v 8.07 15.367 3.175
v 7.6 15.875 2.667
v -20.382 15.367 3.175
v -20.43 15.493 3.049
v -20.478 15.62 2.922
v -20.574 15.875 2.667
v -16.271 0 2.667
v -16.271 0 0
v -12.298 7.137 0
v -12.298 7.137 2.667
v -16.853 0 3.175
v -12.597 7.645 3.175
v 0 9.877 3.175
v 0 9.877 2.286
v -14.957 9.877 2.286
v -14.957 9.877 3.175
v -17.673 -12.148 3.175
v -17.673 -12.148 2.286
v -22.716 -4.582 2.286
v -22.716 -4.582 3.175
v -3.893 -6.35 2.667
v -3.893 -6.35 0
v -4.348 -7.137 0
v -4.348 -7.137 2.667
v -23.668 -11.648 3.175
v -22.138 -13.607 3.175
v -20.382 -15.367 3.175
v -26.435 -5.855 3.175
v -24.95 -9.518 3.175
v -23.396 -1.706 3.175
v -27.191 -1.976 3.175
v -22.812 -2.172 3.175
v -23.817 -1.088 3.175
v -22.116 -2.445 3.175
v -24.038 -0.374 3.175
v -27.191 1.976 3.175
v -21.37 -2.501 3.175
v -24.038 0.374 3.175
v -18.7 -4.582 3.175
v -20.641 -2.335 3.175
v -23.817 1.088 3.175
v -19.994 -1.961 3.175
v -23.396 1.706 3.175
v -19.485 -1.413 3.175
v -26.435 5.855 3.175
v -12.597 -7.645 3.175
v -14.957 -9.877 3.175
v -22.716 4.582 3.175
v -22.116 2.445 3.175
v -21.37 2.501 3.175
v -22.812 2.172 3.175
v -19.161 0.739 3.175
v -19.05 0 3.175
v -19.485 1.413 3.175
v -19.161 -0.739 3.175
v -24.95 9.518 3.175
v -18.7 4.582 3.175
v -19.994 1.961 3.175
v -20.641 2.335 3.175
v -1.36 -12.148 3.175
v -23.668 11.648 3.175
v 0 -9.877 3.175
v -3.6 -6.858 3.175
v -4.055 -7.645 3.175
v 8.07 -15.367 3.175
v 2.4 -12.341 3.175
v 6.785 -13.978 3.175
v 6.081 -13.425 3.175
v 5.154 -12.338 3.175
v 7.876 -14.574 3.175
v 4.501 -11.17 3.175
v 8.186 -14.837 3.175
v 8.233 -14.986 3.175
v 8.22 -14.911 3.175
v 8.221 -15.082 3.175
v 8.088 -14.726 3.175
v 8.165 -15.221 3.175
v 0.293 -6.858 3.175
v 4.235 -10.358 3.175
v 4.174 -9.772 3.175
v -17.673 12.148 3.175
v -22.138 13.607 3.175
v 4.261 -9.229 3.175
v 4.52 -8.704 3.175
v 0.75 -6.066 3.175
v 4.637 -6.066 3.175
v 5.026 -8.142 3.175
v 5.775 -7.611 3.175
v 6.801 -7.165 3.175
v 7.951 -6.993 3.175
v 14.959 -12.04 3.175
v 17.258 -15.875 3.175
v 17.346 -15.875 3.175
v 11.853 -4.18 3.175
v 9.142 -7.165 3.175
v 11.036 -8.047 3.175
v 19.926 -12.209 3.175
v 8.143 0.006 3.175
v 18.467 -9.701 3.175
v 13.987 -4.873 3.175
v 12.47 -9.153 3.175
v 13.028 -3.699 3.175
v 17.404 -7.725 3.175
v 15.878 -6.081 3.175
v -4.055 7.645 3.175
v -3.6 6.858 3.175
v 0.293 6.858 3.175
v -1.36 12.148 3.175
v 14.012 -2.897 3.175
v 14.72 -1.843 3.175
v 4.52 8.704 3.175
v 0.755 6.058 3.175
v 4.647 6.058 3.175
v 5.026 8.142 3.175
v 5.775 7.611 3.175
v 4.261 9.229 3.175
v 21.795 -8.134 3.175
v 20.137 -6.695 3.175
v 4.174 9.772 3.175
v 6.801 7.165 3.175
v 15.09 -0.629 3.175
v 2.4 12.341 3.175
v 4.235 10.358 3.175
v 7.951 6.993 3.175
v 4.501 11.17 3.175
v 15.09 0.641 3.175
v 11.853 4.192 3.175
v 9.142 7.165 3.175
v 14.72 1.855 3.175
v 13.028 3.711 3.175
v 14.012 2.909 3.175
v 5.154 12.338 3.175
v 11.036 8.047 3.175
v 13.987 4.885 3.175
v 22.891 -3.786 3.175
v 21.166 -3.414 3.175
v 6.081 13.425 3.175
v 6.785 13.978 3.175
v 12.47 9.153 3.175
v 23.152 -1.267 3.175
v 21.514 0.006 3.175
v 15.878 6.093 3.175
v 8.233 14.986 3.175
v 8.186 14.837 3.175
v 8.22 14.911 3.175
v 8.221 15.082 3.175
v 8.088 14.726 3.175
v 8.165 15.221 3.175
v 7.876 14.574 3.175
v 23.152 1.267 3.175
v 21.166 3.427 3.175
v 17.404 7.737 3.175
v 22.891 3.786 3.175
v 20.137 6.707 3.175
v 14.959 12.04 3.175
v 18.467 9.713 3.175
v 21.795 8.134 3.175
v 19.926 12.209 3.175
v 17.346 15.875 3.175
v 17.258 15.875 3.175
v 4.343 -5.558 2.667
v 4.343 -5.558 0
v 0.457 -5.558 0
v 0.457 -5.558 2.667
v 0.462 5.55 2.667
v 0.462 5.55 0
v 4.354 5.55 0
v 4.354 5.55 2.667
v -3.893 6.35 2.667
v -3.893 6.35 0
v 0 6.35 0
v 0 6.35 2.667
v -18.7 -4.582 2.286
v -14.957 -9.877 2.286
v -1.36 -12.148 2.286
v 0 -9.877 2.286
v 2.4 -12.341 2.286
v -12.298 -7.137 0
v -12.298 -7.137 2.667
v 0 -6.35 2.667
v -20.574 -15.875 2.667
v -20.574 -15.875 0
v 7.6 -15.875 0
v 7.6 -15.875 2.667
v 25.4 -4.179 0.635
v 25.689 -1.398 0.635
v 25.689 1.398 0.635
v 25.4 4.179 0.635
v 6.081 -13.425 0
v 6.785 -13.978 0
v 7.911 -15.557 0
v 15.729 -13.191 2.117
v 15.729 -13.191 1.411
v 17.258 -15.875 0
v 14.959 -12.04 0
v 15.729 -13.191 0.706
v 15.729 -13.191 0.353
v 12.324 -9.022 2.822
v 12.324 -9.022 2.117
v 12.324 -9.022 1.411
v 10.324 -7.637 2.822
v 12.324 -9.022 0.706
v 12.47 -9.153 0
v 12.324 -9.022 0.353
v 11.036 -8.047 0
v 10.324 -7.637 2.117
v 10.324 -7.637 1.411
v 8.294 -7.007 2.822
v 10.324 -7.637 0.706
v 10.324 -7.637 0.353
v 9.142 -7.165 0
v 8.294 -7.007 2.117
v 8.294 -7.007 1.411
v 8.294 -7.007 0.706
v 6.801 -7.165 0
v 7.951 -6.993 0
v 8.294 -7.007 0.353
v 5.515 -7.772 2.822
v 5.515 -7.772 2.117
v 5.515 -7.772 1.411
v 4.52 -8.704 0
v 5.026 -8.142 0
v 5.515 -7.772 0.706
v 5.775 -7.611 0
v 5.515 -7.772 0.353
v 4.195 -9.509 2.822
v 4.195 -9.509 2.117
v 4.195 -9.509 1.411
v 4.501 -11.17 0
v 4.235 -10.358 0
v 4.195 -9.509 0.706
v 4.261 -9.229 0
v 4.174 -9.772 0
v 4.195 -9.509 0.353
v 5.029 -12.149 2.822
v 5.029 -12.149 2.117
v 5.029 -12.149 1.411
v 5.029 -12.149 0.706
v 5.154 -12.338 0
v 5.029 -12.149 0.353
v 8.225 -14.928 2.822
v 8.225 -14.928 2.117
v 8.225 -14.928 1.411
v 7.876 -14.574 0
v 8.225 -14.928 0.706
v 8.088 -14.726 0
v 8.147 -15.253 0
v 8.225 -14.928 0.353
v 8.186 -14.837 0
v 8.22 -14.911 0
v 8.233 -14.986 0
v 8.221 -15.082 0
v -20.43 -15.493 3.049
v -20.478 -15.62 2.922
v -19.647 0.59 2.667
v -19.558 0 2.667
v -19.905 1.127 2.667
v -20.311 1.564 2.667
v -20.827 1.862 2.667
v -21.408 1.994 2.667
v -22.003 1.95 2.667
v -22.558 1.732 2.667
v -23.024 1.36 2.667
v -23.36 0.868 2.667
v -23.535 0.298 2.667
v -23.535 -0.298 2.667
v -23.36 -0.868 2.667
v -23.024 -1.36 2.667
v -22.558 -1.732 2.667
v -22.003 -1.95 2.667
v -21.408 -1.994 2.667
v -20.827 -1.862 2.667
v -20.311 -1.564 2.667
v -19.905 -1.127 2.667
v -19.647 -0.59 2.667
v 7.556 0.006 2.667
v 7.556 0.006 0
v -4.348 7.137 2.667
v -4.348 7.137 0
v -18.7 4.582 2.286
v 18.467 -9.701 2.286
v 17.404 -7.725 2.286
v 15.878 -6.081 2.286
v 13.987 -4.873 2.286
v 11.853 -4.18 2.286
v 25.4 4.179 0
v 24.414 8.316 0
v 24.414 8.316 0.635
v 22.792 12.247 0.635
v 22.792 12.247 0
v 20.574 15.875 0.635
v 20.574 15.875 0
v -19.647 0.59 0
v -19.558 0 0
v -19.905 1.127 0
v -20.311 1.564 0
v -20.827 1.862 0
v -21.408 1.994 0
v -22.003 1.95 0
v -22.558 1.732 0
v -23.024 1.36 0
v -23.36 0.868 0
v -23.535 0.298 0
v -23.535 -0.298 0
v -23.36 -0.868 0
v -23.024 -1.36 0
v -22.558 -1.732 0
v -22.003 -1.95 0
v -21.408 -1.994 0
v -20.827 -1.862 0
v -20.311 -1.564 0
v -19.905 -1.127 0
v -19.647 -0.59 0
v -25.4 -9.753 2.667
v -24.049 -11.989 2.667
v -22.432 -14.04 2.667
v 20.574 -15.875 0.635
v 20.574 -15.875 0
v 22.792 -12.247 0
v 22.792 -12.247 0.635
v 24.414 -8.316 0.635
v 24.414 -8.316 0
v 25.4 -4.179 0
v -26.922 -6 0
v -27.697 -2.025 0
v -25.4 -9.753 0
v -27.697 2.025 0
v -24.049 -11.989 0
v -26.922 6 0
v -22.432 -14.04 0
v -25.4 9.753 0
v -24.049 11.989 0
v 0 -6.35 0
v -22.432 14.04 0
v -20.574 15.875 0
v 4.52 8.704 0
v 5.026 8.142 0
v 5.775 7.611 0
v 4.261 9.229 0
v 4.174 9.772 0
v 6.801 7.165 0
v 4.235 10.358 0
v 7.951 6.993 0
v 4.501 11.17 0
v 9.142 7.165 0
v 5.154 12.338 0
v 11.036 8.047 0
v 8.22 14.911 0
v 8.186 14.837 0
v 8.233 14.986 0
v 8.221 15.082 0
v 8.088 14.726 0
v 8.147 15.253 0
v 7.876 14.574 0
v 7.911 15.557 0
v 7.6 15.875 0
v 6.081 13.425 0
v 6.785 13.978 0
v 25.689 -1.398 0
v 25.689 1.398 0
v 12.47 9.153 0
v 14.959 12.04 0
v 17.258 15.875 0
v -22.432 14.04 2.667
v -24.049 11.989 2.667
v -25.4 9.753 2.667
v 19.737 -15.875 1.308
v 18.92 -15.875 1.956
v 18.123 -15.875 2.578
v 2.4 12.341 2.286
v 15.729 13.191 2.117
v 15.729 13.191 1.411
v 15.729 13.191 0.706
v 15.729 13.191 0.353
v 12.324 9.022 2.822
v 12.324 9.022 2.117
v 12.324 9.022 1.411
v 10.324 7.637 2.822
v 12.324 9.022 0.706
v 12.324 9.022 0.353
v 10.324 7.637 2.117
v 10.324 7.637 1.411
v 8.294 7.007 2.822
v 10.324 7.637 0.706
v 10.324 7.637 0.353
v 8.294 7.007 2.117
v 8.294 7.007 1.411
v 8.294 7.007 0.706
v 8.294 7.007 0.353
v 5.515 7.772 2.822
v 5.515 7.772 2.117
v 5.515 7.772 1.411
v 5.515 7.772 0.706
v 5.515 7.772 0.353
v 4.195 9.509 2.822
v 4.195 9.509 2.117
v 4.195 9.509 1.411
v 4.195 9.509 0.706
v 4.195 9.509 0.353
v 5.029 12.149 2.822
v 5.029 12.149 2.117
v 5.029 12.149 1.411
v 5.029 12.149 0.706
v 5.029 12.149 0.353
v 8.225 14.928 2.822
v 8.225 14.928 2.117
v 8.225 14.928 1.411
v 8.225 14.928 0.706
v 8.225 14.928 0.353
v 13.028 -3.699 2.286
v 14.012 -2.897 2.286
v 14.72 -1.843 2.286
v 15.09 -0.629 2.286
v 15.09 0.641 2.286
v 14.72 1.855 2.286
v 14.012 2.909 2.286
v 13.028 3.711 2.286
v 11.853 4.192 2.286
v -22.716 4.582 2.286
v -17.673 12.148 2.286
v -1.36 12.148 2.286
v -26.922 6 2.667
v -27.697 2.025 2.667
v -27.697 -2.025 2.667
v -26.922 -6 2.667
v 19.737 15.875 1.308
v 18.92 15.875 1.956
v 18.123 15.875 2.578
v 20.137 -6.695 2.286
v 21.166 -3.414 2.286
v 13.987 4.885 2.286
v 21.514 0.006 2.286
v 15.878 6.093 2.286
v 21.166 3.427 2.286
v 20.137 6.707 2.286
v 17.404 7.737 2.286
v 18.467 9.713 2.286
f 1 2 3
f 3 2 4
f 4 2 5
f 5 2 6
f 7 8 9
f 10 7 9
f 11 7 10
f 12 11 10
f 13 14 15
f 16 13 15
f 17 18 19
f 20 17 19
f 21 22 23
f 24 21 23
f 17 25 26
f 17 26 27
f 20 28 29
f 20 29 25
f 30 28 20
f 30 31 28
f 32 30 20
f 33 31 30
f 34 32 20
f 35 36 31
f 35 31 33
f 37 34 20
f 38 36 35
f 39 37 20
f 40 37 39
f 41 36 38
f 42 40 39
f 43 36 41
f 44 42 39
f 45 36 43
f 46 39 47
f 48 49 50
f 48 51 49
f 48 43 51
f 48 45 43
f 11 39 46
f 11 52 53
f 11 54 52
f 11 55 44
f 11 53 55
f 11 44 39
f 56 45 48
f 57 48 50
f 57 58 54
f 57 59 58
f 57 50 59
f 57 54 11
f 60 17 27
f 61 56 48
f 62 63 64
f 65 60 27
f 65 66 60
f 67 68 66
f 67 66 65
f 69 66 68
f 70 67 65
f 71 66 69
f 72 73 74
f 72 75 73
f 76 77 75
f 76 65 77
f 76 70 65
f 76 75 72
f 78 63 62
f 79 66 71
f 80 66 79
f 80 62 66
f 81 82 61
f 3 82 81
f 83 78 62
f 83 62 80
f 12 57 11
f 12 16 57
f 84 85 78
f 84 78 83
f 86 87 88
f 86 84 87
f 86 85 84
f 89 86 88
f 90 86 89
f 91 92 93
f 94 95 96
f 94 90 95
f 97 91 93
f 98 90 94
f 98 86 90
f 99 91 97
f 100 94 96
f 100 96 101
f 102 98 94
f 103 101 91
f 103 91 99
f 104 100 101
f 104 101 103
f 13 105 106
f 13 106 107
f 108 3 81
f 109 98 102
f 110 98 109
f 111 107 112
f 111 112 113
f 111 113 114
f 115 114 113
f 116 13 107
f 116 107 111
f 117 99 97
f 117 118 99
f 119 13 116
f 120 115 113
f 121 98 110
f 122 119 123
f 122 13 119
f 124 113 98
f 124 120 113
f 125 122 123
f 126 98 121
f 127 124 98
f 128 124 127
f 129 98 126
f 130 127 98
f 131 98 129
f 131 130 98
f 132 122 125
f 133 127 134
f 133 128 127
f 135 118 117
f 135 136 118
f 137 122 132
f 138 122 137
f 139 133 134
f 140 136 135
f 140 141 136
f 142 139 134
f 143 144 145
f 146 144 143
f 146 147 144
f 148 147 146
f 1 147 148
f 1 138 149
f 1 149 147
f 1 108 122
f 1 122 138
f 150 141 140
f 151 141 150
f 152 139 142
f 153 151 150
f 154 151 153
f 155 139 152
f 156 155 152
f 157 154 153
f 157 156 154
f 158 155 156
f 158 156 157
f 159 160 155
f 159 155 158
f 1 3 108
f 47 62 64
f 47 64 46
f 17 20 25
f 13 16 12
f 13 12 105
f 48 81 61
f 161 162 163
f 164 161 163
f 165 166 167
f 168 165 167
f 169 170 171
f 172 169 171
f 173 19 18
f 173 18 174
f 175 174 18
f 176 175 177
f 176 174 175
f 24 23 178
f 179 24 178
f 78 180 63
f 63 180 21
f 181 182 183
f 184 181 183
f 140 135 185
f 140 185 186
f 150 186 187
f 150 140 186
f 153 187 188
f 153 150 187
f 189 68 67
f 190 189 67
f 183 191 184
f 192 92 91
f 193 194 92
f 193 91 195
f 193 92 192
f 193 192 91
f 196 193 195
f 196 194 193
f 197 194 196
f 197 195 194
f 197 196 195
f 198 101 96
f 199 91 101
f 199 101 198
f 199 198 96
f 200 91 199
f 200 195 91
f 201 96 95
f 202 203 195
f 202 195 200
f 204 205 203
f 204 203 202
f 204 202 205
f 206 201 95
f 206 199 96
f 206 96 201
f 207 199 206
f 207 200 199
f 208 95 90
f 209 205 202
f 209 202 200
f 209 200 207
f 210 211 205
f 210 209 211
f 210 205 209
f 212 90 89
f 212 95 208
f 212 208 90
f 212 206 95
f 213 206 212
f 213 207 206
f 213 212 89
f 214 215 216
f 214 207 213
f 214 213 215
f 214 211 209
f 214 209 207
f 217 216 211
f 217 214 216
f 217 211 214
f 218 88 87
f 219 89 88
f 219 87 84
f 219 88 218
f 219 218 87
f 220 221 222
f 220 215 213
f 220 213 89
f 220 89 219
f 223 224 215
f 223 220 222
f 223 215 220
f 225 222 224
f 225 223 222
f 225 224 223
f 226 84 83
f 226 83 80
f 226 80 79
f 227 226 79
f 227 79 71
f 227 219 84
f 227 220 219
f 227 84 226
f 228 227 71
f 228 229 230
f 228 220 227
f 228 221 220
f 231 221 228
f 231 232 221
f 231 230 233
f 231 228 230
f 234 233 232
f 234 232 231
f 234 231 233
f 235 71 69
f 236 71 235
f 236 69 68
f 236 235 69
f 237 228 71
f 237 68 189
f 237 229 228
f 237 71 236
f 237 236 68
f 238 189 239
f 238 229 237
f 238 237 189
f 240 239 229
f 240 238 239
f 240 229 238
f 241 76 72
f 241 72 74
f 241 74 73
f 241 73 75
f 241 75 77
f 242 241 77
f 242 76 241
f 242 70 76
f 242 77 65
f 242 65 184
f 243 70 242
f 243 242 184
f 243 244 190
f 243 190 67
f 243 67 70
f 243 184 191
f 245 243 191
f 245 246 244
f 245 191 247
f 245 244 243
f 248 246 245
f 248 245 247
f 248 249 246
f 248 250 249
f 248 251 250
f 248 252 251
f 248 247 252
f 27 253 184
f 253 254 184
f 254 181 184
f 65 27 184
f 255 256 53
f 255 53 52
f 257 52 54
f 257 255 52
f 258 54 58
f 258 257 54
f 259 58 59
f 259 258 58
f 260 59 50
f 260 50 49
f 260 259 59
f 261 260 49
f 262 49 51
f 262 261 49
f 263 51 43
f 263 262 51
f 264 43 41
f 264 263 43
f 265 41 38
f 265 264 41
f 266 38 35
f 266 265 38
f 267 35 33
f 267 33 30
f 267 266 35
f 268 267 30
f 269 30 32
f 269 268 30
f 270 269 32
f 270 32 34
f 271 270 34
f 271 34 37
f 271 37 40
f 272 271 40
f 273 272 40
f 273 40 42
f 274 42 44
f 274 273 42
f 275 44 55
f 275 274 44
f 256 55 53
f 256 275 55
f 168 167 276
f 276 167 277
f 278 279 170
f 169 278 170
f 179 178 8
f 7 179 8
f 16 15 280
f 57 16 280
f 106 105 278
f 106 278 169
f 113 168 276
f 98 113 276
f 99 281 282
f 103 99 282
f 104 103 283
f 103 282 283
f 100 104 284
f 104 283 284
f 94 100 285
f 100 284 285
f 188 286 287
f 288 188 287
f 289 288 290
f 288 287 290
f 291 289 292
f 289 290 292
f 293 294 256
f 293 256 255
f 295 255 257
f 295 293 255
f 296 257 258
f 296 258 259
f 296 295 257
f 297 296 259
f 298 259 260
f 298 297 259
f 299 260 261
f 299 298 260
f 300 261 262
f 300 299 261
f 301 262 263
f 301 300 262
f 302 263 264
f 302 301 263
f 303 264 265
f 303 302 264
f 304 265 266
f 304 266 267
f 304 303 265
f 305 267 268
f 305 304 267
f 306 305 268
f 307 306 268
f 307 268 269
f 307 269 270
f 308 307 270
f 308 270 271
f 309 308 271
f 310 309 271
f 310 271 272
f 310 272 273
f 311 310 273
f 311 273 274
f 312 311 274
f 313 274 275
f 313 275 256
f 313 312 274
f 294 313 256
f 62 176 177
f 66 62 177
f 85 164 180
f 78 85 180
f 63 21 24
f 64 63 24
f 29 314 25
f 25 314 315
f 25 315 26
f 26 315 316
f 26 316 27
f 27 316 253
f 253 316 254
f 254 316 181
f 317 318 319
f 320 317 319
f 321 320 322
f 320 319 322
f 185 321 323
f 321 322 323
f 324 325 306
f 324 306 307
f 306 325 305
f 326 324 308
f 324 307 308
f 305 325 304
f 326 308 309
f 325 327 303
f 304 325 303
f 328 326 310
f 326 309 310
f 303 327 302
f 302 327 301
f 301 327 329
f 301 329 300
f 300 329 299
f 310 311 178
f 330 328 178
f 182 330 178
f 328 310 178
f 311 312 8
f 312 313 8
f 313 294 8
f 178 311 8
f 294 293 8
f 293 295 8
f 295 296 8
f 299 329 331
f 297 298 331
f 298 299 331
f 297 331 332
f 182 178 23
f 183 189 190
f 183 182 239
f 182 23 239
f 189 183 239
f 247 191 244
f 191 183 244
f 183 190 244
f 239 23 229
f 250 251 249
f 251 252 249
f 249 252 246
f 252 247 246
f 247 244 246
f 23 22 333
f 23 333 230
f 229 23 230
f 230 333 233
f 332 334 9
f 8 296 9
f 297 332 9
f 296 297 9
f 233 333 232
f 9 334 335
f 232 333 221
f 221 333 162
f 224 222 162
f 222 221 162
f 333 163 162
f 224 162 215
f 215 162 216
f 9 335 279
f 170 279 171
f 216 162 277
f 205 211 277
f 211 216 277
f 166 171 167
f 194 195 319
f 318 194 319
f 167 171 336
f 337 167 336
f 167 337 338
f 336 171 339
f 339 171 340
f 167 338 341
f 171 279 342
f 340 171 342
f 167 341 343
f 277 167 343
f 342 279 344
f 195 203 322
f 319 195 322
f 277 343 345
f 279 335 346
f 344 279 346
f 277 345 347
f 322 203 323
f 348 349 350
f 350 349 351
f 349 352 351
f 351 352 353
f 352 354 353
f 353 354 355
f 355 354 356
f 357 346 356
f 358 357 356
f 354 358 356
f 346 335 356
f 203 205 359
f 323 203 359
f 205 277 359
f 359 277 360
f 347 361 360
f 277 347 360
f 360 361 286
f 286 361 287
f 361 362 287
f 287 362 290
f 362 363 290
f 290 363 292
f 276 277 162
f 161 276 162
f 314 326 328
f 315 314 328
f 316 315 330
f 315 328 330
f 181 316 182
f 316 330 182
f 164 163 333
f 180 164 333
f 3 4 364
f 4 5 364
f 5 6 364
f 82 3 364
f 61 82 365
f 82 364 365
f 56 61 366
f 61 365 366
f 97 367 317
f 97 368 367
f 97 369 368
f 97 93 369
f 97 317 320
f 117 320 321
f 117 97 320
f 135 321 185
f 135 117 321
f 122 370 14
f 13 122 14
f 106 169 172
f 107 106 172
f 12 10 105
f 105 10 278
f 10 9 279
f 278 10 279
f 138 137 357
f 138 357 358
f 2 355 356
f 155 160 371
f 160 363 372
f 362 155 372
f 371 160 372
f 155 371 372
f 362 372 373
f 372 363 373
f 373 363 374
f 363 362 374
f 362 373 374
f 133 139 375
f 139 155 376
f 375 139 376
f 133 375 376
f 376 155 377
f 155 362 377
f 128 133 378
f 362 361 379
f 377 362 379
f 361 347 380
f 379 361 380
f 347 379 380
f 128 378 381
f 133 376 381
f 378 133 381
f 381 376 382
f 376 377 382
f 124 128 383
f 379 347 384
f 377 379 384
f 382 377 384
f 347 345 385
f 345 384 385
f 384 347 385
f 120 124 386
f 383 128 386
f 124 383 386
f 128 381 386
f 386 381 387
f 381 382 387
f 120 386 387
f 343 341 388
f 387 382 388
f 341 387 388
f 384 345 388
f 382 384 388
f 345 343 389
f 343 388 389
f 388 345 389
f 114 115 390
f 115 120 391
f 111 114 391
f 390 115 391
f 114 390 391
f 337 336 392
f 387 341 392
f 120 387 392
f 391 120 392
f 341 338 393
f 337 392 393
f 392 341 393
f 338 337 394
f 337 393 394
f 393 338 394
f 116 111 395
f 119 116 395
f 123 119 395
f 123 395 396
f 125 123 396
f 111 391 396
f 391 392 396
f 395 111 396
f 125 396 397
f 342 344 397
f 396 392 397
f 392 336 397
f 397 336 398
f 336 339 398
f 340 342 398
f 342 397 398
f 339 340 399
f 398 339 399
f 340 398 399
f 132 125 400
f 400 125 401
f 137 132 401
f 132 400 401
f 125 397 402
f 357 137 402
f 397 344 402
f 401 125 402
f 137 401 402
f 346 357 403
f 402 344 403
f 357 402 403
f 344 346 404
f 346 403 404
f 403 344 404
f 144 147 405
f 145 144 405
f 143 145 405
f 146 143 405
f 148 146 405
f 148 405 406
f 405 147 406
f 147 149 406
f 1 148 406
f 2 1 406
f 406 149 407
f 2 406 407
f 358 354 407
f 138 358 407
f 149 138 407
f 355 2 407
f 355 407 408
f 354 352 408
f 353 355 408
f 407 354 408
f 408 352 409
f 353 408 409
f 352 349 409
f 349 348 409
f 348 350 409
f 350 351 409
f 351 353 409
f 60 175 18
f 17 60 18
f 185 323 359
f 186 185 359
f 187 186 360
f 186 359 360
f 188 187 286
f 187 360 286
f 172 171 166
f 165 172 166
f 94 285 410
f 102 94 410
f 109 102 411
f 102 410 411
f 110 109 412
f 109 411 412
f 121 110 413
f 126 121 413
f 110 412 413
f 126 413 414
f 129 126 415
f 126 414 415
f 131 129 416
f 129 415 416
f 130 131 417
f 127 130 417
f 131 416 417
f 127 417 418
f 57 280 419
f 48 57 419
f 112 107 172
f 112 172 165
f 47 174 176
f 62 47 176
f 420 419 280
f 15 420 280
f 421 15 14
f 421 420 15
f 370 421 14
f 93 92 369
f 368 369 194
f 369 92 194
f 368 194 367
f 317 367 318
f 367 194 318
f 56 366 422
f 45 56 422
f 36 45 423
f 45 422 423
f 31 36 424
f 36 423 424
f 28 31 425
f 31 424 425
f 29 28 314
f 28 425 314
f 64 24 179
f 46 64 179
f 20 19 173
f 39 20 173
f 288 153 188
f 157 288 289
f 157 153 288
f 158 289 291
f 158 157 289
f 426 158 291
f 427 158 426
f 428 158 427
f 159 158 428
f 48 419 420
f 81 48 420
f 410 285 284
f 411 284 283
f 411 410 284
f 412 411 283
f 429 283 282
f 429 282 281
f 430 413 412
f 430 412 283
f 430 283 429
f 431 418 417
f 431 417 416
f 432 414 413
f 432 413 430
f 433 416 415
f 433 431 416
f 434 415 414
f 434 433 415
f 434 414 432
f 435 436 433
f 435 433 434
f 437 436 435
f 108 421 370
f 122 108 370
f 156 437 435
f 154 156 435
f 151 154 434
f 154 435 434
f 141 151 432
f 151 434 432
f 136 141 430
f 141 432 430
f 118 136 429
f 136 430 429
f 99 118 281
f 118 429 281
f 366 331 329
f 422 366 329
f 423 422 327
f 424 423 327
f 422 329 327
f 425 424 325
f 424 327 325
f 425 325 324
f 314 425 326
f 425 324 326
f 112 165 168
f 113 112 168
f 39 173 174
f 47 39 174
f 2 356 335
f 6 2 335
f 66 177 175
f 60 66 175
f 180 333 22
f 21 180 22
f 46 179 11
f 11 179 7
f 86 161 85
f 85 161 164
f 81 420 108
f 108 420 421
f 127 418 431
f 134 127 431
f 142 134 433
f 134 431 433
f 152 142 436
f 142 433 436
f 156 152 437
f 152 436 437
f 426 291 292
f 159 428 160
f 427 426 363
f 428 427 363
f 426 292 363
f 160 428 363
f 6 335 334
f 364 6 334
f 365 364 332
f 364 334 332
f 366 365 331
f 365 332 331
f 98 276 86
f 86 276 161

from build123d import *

# Parameters (mm, degrees)
F0_R     = 2
F1_DEPTH = 3.175
F2_SIZE2 = 2.54
F2_SIZE  = 2.54
F3_SIZE  = 0.508
F4_DEPTH = 2.286
F5_DEPTH = 2.286


# Not quite as in the source:
# - a feature names something its author has since deleted; it is built from what else it names


with BuildPart() as f1:
    # F0 (on Top) → F1 (new body)
    with BuildSketch(Plane.XY):
        with BuildLine():
            Line((-25.4, -9.7533396771), (-25.4, 9.7533396771))
            ThreePointArc((-25.4, 9.7533396771), (-27.7943947705, 0), (-25.4, -9.7533396771))
        make_face()
        with BuildLine():
            Line((7.5996425003, 15.875), (-20.574, 15.875))
            ThreePointArc((-20.574, 15.875), (-23.2726776835, 13.0393833309), (-25.4, 9.7533396771))
            Line((-25.4, 9.7533396771), (-25.4, -9.7533396771))
            ThreePointArc((-25.4, -9.7533396771), (-23.2726776835, -13.0393833309), (-20.574, -15.875))
            Line((-20.574, -15.875), (7.5996425003, -15.875))
            add(Edge.make_bspline(
                [(17.2575954348, -15.875), (16.8118674755, -15.0360308318), (15.7777378861, -13.0895457095), (12.6385533239, -8.7628284751), (8.4438454096, -6.4903546022), (5.4576611574, -7.5578133093), (3.6996913649, -9.434816458), (4.9096520026, -12.30721807), (6.6995754798, -14.1477736043), (8.6865320781, -14.7997007485), (7.9445844593, -15.5337364181), (7.5996425003, -15.875)],
                knots=[0, 0, 0, 0, 0.1172509784, 0.2720329825, 0.4136469471, 0.5269156212, 0.6254604471, 0.7364742974, 0.8471369559, 0.9289318052, 1, 1, 1, 1], degree=3))
            Line((17.2575954348, -15.875), (19.5524021983, -15.875))
            ThreePointArc((19.5524021983, -15.875), (24.535980368, 0), (19.5524021983, 15.875))
            Line((19.5524021983, 15.875), (17.2575954348, 15.875))
            add(Edge.make_bspline(
                [(17.2575954348, 15.875), (16.8118674755, 15.0360308318), (15.7777378861, 13.0895457095), (12.6385533239, 8.7628284751), (8.4438454096, 6.4903546022), (5.4576611574, 7.5578133093), (3.6996913649, 9.434816458), (4.9096520026, 12.30721807), (6.6995754798, 14.1477736043), (8.6865320781, 14.7997007485), (7.9445844593, 15.5337364181), (7.5996425003, 15.875)],
                knots=[0, 0, 0, 0, 0.1172509784, 0.2720329825, 0.4136469471, 0.5269156212, 0.6254604471, 0.7364742974, 0.8471369559, 0.9289318052, 1, 1, 1, 1], degree=3))
        make_face()
        Polygon((0, -9.8765036091), (2.4003, -12.3413112015), (-1.3600544771, -12.1478205547), (-17.6725629717, -12.1478205547), (-22.7162260562, -4.5817312784), (-18.6995025724, -4.5817312784), (-14.9566456676, -9.8765036091), align=None, mode=Mode.SUBTRACT)
        with Locations((-21.5576495975, 0)):
            Circle(F0_R, mode=Mode.SUBTRACT)
        Polygon((-16.2712801248, 0), (-12.2982449182, 7.1374), (-4.3480449182, 7.1374), (-3.8934393163, 6.35), (0, 6.35), (0.4617137668, 5.5502882974), (4.3540745974, 5.5502882974), (7.5559447504, 0.0061843585), (4.3434, -5.5581063708), (0.4572, -5.5581063708), (0, -6.35), (-3.8934393163, -6.35), (-4.3480449182, -7.1374), (-12.2982449182, -7.1374), align=None, mode=Mode.SUBTRACT)
        Polygon((-14.9566456676, 9.8765036091), (-18.6995025724, 4.5817312784), (-22.7162260562, 4.5817312784), (-17.6725629717, 12.1478205547), (-1.3600544771, 12.1478205547), (2.4003, 12.3413112015), (0, 9.8765036091), align=None, mode=Mode.SUBTRACT)
        with BuildLine():
            ThreePointArc((18.4671971947, -9.7006708384), (15.8776249613, -6.080528756), (11.8529647589, -4.1796281002))
            ThreePointArc((11.8529647589, -4.1796281002), (15.1365712278, 0.0061843585), (11.8529647589, 4.1919968173))
            ThreePointArc((11.8529647589, 4.1919968173), (15.8776249613, 6.092897473), (18.4671971947, 9.7130395554))
            ThreePointArc((18.4671971947, 9.7130395554), (21.5143278197, 0.0061843585), (18.4671971947, -9.7006708384))
        make_face(mode=Mode.SUBTRACT)
        with BuildLine():
            ThreePointArc((25.4, -4.1788812389), (25.7248773783, 0), (25.4, 4.1788812389))
            Line((25.4, 4.1788812389), (25.4, -4.1788812389))
        make_face()
        with BuildLine():
            Line((20.574, 15.875), (19.5524021983, 15.875))
            ThreePointArc((19.5524021983, 15.875), (24.535980368, 0), (19.5524021983, -15.875))
            Line((19.5524021983, -15.875), (20.574, -15.875))
            ThreePointArc((20.574, -15.875), (23.6807693851, -10.3132006276), (25.4, -4.1788812389))
            Line((25.4, -4.1788812389), (25.4, 4.1788812389))
            ThreePointArc((25.4, 4.1788812389), (23.6807693851, 10.3132006276), (20.574, 15.875))
        make_face()
    extrude(amount=F1_DEPTH)

    # F2
    f2_edges = [f1.edges().sort_by_distance(p)[0] for p in [
        (25.724877, 0, 3.175),
    ]]
    chamfer(f2_edges, length=F2_SIZE, length2=F2_SIZE2)

    # F3
    f3_edges = [f1.edges().sort_by_distance(p)[0] for p in [
        (-23.55765, 0, 3.175),
        (-14.284763, 3.5687, 3.175),
        (-14.284763, -3.5687, 3.175),
        (-8.323145, -7.1374, 3.175),
        (-8.323145, 7.1374, 3.175),
        (-4.120742, -6.7437, 3.175),
        (-1.94672, -6.35, 3.175),
        (0.2286, -5.954053, 3.175),
        (2.4003, -5.558106, 3.175),
        (5.949672, -2.775961, 3.175),
        (5.95501, 2.778236, 3.175),
        (-4.120742, 6.7437, 3.175),
        (-1.94672, 6.35, 3.175),
        (0.230857, 5.950144, 3.175),
        (2.407894, 5.550288, 3.175),
        (-6.487179, 15.875, 3.175),
        (-27.794395, 0, 3.175),
        (-6.487179, -15.875, 3.175),
    ]]
    chamfer(f3_edges, length=F3_SIZE)

    # F0 (on Top) → F4 (join)
    with BuildSketch(Plane.XY):
        Polygon((-1.3600544771, -12.1478205547), (2.4003, -12.3413112015), (0, -9.8765036091), (-14.9566456676, -9.8765036091), (-18.6995025724, -4.5817312784), (-22.7162260562, -4.5817312784), (-17.6725629717, -12.1478205547), align=None)
        Polygon((-22.7162260562, 4.5817312784), (-18.6995025724, 4.5817312784), (-14.9566456676, 9.8765036091), (0, 9.8765036091), (2.4003, 12.3413112015), (-1.3600544771, 12.1478205547), (-17.6725629717, 12.1478205547), align=None)
    extrude(amount=F4_DEPTH)

    # F0 (on Top) → F5 (join)
    with BuildSketch(Plane.XY):
        with BuildLine():
            ThreePointArc((11.8529647589, 4.1919968173), (15.1365712278, 0.0061843585), (11.8529647589, -4.1796281002))
            ThreePointArc((11.8529647589, -4.1796281002), (15.8776249613, -6.080528756), (18.4671971947, -9.7006708384))
            ThreePointArc((18.4671971947, -9.7006708384), (21.5143278197, 0.0061843585), (18.4671971947, 9.7130395554))
            ThreePointArc((18.4671971947, 9.7130395554), (15.8776249613, 6.092897473), (11.8529647589, 4.1919968173))
        make_face()
    extrude(amount=F5_DEPTH)


solid = f1.part
